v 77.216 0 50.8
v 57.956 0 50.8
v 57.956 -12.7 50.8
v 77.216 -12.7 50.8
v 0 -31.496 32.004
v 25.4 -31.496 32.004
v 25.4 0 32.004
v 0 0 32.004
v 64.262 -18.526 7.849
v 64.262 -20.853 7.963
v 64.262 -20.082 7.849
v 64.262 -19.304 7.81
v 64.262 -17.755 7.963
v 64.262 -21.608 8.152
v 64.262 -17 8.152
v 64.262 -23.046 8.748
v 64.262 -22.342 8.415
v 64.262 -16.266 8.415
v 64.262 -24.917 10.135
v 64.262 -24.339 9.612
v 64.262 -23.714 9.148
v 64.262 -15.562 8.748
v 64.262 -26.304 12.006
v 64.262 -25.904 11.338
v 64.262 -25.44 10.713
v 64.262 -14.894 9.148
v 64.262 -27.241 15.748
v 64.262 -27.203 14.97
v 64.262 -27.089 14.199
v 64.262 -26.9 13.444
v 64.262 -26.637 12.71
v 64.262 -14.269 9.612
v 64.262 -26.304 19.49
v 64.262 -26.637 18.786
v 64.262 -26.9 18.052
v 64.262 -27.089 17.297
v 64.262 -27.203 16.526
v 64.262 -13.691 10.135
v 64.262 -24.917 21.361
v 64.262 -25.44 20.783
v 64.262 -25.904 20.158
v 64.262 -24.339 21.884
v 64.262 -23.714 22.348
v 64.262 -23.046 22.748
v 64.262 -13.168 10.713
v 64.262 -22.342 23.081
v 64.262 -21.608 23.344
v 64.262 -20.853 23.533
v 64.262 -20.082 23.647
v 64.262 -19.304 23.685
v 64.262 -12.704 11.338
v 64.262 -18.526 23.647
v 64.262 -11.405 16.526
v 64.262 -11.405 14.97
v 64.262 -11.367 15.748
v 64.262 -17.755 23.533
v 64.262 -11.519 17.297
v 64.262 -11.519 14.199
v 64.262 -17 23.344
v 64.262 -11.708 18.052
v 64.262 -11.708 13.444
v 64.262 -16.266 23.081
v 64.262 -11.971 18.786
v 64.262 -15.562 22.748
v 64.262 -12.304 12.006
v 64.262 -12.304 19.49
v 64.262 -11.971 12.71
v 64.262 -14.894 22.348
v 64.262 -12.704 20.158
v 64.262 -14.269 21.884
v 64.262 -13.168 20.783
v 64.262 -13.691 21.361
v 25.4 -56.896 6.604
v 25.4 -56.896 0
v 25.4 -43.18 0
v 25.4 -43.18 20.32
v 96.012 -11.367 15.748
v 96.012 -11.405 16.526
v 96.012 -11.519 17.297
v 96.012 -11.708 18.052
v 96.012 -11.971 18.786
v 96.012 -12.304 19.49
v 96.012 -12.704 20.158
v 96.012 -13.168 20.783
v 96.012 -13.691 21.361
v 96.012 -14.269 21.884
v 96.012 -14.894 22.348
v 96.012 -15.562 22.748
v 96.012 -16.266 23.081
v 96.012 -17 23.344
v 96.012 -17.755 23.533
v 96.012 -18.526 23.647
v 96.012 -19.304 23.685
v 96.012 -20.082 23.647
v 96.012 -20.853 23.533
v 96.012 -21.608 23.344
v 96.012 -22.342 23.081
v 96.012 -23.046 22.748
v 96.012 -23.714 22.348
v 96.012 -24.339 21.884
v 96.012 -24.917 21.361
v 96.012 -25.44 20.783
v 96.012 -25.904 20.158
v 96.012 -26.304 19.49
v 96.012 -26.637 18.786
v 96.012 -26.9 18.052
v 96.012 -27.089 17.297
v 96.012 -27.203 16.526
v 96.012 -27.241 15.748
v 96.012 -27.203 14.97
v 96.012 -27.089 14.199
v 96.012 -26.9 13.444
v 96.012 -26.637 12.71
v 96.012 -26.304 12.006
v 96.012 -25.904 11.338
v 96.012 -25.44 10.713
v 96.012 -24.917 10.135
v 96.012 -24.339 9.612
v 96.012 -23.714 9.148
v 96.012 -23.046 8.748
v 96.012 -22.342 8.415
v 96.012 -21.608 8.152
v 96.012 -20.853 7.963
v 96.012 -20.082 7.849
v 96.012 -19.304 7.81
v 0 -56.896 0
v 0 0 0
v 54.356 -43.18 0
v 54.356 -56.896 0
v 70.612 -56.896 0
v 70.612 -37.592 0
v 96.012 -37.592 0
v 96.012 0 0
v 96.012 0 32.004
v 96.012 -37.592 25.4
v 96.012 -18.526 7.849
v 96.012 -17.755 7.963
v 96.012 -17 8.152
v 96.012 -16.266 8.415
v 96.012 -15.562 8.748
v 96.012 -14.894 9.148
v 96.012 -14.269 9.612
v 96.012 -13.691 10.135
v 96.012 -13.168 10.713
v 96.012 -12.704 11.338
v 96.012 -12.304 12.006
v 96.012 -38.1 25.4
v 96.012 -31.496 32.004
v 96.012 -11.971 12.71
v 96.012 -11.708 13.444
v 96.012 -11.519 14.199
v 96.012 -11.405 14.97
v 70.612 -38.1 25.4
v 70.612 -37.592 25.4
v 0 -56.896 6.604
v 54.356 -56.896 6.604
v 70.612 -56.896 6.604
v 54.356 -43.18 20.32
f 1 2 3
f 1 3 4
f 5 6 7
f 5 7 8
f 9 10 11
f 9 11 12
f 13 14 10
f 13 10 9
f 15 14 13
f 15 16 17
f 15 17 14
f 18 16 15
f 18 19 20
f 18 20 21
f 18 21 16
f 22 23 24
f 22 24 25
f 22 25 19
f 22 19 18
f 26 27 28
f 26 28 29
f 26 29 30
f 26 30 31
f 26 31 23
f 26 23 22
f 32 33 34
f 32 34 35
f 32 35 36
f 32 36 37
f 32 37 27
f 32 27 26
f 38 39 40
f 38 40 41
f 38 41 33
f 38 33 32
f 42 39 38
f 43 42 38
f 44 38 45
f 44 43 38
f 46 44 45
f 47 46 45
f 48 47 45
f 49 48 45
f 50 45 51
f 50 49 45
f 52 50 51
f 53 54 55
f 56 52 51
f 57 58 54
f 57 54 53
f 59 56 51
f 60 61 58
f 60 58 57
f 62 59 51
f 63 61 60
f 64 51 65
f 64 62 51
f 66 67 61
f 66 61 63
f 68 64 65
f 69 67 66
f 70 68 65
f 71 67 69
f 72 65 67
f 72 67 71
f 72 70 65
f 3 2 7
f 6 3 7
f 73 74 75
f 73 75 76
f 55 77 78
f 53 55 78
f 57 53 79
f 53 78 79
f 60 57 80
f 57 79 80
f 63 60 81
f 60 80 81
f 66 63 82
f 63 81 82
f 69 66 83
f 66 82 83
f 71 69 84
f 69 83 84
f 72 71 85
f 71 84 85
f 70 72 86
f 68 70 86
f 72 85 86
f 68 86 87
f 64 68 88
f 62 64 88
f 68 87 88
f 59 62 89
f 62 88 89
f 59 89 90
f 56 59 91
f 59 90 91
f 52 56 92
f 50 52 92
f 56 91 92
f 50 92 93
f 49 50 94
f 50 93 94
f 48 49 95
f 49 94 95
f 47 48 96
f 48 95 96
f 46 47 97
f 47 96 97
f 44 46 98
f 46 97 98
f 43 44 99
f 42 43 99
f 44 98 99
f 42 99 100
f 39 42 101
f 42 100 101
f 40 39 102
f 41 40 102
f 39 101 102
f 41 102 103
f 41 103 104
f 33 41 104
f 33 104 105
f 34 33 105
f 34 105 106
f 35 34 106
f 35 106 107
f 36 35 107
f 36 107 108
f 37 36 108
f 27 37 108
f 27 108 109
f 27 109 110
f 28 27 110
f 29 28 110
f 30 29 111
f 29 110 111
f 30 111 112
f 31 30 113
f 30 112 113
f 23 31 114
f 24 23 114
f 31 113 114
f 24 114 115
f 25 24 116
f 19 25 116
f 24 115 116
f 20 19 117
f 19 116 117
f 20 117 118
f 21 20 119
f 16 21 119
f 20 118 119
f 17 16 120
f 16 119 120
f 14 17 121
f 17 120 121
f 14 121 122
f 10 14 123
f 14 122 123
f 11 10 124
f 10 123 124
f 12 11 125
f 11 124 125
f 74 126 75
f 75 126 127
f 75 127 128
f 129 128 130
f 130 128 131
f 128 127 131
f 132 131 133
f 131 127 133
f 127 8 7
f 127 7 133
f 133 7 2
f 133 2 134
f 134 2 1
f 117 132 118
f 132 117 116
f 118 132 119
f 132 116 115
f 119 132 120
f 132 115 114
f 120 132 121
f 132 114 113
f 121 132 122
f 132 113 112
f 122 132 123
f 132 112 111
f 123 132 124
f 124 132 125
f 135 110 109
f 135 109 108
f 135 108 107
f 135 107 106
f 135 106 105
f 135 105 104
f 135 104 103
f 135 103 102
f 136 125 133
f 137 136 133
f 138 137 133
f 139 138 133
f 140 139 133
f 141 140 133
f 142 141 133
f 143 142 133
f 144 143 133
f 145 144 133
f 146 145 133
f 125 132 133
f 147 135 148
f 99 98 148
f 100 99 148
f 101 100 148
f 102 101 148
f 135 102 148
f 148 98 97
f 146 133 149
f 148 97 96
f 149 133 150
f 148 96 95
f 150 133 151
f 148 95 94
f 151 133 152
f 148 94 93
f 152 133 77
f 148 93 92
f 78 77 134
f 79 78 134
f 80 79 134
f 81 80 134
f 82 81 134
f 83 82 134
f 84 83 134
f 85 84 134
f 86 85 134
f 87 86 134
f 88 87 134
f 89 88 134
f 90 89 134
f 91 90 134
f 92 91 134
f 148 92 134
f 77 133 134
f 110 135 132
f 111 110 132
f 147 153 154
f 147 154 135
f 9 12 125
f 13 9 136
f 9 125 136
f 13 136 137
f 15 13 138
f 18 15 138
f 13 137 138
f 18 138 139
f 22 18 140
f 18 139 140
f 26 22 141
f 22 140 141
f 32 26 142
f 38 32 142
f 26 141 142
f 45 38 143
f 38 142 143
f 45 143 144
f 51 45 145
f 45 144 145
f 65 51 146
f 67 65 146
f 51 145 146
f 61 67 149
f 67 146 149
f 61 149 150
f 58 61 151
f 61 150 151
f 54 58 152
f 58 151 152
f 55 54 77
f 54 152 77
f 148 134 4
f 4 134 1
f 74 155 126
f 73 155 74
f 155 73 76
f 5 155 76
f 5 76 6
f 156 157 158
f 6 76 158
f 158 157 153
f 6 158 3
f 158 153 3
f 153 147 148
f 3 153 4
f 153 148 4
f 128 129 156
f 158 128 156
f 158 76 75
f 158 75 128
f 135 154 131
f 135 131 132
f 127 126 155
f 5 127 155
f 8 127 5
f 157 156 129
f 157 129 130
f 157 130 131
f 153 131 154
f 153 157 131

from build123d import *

# Parameters (mm, degrees)
F0_W      = 96.012
F0_H      = 50.8
F1_DEPTH  = 56.896
F3_DEPTH  = 96.012
F5_DEPTH  = 56.896
F7_DEPTH  = 56.896
F9_DEPTH  = 31.75
F10_W     = 25.4
F10_H     = 25.4
F11_DEPTH = 19.304
F12_W     = 28.956
F12_H     = 20.32
F13_DEPTH = 13.716


with BuildPart() as f1:
    # F0 (on Front) → F1 (new body)
    with BuildSketch(Plane.XZ):
        with Locations((48.006, 25.4)):
            Rectangle(F0_W, F0_H)
    extrude(amount=F1_DEPTH)

    # F2 (on face) → F3 (cut)
    with BuildSketch(Plane.YZ.offset(96.012)):
        Polygon((-56.896, 6.604), (-12.7, 50.8), (-56.896, 50.8), align=None)
    extrude(amount=-F3_DEPTH, mode=Mode.SUBTRACT)

    # F4 (on face) → F5 (cut)
    with BuildSketch(Plane(origin=(0, 0, 0), x_dir=(-1, 0, 0), z_dir=(0, 1, 0))):
        Polygon((0, 32.004), (0, 50.8), (-57.955627, 50.8), (-25.4, 32.004), align=None)
    extrude(amount=-F5_DEPTH, mode=Mode.SUBTRACT)

    # F6 (on face) → F7 (cut)
    with BuildSketch(Plane(origin=(0, 0, 0), x_dir=(-1, 0, 0), z_dir=(0, 1, 0))):
        Polygon((-77.216, 50.8), (-96.012, 50.8), (-96.012, 32.004), align=None)
    extrude(amount=-F7_DEPTH, mode=Mode.SUBTRACT)

    # F8 (on face) → F9 (cut)
    with BuildSketch(Plane.YZ.offset(96.012)):
        with BuildLine():
            ThreePointArc((-19.304, 7.8105), (-13.69134, 10.13534), (-11.3665, 15.748))
            ThreePointArc((-11.3665, 15.748), (-24.91666, 21.36066), (-19.304, 7.8105))
        make_face()
    extrude(amount=-F9_DEPTH, mode=Mode.SUBTRACT)

    # F10 (on face) → F11 (cut)
    with BuildSketch(Plane.XZ.offset(56.896)):
        with Locations((83.312, 12.7)):
            Rectangle(F10_W, F10_H)
    extrude(amount=-F11_DEPTH, mode=Mode.SUBTRACT)

    # F12 (on face) → F13 (cut)
    with BuildSketch(Plane.XZ.offset(56.896)):
        with Locations((39.878, 10.16)):
            Rectangle(F12_W, F12_H)
    extrude(amount=-F13_DEPTH, mode=Mode.SUBTRACT)


solid = f1.part
